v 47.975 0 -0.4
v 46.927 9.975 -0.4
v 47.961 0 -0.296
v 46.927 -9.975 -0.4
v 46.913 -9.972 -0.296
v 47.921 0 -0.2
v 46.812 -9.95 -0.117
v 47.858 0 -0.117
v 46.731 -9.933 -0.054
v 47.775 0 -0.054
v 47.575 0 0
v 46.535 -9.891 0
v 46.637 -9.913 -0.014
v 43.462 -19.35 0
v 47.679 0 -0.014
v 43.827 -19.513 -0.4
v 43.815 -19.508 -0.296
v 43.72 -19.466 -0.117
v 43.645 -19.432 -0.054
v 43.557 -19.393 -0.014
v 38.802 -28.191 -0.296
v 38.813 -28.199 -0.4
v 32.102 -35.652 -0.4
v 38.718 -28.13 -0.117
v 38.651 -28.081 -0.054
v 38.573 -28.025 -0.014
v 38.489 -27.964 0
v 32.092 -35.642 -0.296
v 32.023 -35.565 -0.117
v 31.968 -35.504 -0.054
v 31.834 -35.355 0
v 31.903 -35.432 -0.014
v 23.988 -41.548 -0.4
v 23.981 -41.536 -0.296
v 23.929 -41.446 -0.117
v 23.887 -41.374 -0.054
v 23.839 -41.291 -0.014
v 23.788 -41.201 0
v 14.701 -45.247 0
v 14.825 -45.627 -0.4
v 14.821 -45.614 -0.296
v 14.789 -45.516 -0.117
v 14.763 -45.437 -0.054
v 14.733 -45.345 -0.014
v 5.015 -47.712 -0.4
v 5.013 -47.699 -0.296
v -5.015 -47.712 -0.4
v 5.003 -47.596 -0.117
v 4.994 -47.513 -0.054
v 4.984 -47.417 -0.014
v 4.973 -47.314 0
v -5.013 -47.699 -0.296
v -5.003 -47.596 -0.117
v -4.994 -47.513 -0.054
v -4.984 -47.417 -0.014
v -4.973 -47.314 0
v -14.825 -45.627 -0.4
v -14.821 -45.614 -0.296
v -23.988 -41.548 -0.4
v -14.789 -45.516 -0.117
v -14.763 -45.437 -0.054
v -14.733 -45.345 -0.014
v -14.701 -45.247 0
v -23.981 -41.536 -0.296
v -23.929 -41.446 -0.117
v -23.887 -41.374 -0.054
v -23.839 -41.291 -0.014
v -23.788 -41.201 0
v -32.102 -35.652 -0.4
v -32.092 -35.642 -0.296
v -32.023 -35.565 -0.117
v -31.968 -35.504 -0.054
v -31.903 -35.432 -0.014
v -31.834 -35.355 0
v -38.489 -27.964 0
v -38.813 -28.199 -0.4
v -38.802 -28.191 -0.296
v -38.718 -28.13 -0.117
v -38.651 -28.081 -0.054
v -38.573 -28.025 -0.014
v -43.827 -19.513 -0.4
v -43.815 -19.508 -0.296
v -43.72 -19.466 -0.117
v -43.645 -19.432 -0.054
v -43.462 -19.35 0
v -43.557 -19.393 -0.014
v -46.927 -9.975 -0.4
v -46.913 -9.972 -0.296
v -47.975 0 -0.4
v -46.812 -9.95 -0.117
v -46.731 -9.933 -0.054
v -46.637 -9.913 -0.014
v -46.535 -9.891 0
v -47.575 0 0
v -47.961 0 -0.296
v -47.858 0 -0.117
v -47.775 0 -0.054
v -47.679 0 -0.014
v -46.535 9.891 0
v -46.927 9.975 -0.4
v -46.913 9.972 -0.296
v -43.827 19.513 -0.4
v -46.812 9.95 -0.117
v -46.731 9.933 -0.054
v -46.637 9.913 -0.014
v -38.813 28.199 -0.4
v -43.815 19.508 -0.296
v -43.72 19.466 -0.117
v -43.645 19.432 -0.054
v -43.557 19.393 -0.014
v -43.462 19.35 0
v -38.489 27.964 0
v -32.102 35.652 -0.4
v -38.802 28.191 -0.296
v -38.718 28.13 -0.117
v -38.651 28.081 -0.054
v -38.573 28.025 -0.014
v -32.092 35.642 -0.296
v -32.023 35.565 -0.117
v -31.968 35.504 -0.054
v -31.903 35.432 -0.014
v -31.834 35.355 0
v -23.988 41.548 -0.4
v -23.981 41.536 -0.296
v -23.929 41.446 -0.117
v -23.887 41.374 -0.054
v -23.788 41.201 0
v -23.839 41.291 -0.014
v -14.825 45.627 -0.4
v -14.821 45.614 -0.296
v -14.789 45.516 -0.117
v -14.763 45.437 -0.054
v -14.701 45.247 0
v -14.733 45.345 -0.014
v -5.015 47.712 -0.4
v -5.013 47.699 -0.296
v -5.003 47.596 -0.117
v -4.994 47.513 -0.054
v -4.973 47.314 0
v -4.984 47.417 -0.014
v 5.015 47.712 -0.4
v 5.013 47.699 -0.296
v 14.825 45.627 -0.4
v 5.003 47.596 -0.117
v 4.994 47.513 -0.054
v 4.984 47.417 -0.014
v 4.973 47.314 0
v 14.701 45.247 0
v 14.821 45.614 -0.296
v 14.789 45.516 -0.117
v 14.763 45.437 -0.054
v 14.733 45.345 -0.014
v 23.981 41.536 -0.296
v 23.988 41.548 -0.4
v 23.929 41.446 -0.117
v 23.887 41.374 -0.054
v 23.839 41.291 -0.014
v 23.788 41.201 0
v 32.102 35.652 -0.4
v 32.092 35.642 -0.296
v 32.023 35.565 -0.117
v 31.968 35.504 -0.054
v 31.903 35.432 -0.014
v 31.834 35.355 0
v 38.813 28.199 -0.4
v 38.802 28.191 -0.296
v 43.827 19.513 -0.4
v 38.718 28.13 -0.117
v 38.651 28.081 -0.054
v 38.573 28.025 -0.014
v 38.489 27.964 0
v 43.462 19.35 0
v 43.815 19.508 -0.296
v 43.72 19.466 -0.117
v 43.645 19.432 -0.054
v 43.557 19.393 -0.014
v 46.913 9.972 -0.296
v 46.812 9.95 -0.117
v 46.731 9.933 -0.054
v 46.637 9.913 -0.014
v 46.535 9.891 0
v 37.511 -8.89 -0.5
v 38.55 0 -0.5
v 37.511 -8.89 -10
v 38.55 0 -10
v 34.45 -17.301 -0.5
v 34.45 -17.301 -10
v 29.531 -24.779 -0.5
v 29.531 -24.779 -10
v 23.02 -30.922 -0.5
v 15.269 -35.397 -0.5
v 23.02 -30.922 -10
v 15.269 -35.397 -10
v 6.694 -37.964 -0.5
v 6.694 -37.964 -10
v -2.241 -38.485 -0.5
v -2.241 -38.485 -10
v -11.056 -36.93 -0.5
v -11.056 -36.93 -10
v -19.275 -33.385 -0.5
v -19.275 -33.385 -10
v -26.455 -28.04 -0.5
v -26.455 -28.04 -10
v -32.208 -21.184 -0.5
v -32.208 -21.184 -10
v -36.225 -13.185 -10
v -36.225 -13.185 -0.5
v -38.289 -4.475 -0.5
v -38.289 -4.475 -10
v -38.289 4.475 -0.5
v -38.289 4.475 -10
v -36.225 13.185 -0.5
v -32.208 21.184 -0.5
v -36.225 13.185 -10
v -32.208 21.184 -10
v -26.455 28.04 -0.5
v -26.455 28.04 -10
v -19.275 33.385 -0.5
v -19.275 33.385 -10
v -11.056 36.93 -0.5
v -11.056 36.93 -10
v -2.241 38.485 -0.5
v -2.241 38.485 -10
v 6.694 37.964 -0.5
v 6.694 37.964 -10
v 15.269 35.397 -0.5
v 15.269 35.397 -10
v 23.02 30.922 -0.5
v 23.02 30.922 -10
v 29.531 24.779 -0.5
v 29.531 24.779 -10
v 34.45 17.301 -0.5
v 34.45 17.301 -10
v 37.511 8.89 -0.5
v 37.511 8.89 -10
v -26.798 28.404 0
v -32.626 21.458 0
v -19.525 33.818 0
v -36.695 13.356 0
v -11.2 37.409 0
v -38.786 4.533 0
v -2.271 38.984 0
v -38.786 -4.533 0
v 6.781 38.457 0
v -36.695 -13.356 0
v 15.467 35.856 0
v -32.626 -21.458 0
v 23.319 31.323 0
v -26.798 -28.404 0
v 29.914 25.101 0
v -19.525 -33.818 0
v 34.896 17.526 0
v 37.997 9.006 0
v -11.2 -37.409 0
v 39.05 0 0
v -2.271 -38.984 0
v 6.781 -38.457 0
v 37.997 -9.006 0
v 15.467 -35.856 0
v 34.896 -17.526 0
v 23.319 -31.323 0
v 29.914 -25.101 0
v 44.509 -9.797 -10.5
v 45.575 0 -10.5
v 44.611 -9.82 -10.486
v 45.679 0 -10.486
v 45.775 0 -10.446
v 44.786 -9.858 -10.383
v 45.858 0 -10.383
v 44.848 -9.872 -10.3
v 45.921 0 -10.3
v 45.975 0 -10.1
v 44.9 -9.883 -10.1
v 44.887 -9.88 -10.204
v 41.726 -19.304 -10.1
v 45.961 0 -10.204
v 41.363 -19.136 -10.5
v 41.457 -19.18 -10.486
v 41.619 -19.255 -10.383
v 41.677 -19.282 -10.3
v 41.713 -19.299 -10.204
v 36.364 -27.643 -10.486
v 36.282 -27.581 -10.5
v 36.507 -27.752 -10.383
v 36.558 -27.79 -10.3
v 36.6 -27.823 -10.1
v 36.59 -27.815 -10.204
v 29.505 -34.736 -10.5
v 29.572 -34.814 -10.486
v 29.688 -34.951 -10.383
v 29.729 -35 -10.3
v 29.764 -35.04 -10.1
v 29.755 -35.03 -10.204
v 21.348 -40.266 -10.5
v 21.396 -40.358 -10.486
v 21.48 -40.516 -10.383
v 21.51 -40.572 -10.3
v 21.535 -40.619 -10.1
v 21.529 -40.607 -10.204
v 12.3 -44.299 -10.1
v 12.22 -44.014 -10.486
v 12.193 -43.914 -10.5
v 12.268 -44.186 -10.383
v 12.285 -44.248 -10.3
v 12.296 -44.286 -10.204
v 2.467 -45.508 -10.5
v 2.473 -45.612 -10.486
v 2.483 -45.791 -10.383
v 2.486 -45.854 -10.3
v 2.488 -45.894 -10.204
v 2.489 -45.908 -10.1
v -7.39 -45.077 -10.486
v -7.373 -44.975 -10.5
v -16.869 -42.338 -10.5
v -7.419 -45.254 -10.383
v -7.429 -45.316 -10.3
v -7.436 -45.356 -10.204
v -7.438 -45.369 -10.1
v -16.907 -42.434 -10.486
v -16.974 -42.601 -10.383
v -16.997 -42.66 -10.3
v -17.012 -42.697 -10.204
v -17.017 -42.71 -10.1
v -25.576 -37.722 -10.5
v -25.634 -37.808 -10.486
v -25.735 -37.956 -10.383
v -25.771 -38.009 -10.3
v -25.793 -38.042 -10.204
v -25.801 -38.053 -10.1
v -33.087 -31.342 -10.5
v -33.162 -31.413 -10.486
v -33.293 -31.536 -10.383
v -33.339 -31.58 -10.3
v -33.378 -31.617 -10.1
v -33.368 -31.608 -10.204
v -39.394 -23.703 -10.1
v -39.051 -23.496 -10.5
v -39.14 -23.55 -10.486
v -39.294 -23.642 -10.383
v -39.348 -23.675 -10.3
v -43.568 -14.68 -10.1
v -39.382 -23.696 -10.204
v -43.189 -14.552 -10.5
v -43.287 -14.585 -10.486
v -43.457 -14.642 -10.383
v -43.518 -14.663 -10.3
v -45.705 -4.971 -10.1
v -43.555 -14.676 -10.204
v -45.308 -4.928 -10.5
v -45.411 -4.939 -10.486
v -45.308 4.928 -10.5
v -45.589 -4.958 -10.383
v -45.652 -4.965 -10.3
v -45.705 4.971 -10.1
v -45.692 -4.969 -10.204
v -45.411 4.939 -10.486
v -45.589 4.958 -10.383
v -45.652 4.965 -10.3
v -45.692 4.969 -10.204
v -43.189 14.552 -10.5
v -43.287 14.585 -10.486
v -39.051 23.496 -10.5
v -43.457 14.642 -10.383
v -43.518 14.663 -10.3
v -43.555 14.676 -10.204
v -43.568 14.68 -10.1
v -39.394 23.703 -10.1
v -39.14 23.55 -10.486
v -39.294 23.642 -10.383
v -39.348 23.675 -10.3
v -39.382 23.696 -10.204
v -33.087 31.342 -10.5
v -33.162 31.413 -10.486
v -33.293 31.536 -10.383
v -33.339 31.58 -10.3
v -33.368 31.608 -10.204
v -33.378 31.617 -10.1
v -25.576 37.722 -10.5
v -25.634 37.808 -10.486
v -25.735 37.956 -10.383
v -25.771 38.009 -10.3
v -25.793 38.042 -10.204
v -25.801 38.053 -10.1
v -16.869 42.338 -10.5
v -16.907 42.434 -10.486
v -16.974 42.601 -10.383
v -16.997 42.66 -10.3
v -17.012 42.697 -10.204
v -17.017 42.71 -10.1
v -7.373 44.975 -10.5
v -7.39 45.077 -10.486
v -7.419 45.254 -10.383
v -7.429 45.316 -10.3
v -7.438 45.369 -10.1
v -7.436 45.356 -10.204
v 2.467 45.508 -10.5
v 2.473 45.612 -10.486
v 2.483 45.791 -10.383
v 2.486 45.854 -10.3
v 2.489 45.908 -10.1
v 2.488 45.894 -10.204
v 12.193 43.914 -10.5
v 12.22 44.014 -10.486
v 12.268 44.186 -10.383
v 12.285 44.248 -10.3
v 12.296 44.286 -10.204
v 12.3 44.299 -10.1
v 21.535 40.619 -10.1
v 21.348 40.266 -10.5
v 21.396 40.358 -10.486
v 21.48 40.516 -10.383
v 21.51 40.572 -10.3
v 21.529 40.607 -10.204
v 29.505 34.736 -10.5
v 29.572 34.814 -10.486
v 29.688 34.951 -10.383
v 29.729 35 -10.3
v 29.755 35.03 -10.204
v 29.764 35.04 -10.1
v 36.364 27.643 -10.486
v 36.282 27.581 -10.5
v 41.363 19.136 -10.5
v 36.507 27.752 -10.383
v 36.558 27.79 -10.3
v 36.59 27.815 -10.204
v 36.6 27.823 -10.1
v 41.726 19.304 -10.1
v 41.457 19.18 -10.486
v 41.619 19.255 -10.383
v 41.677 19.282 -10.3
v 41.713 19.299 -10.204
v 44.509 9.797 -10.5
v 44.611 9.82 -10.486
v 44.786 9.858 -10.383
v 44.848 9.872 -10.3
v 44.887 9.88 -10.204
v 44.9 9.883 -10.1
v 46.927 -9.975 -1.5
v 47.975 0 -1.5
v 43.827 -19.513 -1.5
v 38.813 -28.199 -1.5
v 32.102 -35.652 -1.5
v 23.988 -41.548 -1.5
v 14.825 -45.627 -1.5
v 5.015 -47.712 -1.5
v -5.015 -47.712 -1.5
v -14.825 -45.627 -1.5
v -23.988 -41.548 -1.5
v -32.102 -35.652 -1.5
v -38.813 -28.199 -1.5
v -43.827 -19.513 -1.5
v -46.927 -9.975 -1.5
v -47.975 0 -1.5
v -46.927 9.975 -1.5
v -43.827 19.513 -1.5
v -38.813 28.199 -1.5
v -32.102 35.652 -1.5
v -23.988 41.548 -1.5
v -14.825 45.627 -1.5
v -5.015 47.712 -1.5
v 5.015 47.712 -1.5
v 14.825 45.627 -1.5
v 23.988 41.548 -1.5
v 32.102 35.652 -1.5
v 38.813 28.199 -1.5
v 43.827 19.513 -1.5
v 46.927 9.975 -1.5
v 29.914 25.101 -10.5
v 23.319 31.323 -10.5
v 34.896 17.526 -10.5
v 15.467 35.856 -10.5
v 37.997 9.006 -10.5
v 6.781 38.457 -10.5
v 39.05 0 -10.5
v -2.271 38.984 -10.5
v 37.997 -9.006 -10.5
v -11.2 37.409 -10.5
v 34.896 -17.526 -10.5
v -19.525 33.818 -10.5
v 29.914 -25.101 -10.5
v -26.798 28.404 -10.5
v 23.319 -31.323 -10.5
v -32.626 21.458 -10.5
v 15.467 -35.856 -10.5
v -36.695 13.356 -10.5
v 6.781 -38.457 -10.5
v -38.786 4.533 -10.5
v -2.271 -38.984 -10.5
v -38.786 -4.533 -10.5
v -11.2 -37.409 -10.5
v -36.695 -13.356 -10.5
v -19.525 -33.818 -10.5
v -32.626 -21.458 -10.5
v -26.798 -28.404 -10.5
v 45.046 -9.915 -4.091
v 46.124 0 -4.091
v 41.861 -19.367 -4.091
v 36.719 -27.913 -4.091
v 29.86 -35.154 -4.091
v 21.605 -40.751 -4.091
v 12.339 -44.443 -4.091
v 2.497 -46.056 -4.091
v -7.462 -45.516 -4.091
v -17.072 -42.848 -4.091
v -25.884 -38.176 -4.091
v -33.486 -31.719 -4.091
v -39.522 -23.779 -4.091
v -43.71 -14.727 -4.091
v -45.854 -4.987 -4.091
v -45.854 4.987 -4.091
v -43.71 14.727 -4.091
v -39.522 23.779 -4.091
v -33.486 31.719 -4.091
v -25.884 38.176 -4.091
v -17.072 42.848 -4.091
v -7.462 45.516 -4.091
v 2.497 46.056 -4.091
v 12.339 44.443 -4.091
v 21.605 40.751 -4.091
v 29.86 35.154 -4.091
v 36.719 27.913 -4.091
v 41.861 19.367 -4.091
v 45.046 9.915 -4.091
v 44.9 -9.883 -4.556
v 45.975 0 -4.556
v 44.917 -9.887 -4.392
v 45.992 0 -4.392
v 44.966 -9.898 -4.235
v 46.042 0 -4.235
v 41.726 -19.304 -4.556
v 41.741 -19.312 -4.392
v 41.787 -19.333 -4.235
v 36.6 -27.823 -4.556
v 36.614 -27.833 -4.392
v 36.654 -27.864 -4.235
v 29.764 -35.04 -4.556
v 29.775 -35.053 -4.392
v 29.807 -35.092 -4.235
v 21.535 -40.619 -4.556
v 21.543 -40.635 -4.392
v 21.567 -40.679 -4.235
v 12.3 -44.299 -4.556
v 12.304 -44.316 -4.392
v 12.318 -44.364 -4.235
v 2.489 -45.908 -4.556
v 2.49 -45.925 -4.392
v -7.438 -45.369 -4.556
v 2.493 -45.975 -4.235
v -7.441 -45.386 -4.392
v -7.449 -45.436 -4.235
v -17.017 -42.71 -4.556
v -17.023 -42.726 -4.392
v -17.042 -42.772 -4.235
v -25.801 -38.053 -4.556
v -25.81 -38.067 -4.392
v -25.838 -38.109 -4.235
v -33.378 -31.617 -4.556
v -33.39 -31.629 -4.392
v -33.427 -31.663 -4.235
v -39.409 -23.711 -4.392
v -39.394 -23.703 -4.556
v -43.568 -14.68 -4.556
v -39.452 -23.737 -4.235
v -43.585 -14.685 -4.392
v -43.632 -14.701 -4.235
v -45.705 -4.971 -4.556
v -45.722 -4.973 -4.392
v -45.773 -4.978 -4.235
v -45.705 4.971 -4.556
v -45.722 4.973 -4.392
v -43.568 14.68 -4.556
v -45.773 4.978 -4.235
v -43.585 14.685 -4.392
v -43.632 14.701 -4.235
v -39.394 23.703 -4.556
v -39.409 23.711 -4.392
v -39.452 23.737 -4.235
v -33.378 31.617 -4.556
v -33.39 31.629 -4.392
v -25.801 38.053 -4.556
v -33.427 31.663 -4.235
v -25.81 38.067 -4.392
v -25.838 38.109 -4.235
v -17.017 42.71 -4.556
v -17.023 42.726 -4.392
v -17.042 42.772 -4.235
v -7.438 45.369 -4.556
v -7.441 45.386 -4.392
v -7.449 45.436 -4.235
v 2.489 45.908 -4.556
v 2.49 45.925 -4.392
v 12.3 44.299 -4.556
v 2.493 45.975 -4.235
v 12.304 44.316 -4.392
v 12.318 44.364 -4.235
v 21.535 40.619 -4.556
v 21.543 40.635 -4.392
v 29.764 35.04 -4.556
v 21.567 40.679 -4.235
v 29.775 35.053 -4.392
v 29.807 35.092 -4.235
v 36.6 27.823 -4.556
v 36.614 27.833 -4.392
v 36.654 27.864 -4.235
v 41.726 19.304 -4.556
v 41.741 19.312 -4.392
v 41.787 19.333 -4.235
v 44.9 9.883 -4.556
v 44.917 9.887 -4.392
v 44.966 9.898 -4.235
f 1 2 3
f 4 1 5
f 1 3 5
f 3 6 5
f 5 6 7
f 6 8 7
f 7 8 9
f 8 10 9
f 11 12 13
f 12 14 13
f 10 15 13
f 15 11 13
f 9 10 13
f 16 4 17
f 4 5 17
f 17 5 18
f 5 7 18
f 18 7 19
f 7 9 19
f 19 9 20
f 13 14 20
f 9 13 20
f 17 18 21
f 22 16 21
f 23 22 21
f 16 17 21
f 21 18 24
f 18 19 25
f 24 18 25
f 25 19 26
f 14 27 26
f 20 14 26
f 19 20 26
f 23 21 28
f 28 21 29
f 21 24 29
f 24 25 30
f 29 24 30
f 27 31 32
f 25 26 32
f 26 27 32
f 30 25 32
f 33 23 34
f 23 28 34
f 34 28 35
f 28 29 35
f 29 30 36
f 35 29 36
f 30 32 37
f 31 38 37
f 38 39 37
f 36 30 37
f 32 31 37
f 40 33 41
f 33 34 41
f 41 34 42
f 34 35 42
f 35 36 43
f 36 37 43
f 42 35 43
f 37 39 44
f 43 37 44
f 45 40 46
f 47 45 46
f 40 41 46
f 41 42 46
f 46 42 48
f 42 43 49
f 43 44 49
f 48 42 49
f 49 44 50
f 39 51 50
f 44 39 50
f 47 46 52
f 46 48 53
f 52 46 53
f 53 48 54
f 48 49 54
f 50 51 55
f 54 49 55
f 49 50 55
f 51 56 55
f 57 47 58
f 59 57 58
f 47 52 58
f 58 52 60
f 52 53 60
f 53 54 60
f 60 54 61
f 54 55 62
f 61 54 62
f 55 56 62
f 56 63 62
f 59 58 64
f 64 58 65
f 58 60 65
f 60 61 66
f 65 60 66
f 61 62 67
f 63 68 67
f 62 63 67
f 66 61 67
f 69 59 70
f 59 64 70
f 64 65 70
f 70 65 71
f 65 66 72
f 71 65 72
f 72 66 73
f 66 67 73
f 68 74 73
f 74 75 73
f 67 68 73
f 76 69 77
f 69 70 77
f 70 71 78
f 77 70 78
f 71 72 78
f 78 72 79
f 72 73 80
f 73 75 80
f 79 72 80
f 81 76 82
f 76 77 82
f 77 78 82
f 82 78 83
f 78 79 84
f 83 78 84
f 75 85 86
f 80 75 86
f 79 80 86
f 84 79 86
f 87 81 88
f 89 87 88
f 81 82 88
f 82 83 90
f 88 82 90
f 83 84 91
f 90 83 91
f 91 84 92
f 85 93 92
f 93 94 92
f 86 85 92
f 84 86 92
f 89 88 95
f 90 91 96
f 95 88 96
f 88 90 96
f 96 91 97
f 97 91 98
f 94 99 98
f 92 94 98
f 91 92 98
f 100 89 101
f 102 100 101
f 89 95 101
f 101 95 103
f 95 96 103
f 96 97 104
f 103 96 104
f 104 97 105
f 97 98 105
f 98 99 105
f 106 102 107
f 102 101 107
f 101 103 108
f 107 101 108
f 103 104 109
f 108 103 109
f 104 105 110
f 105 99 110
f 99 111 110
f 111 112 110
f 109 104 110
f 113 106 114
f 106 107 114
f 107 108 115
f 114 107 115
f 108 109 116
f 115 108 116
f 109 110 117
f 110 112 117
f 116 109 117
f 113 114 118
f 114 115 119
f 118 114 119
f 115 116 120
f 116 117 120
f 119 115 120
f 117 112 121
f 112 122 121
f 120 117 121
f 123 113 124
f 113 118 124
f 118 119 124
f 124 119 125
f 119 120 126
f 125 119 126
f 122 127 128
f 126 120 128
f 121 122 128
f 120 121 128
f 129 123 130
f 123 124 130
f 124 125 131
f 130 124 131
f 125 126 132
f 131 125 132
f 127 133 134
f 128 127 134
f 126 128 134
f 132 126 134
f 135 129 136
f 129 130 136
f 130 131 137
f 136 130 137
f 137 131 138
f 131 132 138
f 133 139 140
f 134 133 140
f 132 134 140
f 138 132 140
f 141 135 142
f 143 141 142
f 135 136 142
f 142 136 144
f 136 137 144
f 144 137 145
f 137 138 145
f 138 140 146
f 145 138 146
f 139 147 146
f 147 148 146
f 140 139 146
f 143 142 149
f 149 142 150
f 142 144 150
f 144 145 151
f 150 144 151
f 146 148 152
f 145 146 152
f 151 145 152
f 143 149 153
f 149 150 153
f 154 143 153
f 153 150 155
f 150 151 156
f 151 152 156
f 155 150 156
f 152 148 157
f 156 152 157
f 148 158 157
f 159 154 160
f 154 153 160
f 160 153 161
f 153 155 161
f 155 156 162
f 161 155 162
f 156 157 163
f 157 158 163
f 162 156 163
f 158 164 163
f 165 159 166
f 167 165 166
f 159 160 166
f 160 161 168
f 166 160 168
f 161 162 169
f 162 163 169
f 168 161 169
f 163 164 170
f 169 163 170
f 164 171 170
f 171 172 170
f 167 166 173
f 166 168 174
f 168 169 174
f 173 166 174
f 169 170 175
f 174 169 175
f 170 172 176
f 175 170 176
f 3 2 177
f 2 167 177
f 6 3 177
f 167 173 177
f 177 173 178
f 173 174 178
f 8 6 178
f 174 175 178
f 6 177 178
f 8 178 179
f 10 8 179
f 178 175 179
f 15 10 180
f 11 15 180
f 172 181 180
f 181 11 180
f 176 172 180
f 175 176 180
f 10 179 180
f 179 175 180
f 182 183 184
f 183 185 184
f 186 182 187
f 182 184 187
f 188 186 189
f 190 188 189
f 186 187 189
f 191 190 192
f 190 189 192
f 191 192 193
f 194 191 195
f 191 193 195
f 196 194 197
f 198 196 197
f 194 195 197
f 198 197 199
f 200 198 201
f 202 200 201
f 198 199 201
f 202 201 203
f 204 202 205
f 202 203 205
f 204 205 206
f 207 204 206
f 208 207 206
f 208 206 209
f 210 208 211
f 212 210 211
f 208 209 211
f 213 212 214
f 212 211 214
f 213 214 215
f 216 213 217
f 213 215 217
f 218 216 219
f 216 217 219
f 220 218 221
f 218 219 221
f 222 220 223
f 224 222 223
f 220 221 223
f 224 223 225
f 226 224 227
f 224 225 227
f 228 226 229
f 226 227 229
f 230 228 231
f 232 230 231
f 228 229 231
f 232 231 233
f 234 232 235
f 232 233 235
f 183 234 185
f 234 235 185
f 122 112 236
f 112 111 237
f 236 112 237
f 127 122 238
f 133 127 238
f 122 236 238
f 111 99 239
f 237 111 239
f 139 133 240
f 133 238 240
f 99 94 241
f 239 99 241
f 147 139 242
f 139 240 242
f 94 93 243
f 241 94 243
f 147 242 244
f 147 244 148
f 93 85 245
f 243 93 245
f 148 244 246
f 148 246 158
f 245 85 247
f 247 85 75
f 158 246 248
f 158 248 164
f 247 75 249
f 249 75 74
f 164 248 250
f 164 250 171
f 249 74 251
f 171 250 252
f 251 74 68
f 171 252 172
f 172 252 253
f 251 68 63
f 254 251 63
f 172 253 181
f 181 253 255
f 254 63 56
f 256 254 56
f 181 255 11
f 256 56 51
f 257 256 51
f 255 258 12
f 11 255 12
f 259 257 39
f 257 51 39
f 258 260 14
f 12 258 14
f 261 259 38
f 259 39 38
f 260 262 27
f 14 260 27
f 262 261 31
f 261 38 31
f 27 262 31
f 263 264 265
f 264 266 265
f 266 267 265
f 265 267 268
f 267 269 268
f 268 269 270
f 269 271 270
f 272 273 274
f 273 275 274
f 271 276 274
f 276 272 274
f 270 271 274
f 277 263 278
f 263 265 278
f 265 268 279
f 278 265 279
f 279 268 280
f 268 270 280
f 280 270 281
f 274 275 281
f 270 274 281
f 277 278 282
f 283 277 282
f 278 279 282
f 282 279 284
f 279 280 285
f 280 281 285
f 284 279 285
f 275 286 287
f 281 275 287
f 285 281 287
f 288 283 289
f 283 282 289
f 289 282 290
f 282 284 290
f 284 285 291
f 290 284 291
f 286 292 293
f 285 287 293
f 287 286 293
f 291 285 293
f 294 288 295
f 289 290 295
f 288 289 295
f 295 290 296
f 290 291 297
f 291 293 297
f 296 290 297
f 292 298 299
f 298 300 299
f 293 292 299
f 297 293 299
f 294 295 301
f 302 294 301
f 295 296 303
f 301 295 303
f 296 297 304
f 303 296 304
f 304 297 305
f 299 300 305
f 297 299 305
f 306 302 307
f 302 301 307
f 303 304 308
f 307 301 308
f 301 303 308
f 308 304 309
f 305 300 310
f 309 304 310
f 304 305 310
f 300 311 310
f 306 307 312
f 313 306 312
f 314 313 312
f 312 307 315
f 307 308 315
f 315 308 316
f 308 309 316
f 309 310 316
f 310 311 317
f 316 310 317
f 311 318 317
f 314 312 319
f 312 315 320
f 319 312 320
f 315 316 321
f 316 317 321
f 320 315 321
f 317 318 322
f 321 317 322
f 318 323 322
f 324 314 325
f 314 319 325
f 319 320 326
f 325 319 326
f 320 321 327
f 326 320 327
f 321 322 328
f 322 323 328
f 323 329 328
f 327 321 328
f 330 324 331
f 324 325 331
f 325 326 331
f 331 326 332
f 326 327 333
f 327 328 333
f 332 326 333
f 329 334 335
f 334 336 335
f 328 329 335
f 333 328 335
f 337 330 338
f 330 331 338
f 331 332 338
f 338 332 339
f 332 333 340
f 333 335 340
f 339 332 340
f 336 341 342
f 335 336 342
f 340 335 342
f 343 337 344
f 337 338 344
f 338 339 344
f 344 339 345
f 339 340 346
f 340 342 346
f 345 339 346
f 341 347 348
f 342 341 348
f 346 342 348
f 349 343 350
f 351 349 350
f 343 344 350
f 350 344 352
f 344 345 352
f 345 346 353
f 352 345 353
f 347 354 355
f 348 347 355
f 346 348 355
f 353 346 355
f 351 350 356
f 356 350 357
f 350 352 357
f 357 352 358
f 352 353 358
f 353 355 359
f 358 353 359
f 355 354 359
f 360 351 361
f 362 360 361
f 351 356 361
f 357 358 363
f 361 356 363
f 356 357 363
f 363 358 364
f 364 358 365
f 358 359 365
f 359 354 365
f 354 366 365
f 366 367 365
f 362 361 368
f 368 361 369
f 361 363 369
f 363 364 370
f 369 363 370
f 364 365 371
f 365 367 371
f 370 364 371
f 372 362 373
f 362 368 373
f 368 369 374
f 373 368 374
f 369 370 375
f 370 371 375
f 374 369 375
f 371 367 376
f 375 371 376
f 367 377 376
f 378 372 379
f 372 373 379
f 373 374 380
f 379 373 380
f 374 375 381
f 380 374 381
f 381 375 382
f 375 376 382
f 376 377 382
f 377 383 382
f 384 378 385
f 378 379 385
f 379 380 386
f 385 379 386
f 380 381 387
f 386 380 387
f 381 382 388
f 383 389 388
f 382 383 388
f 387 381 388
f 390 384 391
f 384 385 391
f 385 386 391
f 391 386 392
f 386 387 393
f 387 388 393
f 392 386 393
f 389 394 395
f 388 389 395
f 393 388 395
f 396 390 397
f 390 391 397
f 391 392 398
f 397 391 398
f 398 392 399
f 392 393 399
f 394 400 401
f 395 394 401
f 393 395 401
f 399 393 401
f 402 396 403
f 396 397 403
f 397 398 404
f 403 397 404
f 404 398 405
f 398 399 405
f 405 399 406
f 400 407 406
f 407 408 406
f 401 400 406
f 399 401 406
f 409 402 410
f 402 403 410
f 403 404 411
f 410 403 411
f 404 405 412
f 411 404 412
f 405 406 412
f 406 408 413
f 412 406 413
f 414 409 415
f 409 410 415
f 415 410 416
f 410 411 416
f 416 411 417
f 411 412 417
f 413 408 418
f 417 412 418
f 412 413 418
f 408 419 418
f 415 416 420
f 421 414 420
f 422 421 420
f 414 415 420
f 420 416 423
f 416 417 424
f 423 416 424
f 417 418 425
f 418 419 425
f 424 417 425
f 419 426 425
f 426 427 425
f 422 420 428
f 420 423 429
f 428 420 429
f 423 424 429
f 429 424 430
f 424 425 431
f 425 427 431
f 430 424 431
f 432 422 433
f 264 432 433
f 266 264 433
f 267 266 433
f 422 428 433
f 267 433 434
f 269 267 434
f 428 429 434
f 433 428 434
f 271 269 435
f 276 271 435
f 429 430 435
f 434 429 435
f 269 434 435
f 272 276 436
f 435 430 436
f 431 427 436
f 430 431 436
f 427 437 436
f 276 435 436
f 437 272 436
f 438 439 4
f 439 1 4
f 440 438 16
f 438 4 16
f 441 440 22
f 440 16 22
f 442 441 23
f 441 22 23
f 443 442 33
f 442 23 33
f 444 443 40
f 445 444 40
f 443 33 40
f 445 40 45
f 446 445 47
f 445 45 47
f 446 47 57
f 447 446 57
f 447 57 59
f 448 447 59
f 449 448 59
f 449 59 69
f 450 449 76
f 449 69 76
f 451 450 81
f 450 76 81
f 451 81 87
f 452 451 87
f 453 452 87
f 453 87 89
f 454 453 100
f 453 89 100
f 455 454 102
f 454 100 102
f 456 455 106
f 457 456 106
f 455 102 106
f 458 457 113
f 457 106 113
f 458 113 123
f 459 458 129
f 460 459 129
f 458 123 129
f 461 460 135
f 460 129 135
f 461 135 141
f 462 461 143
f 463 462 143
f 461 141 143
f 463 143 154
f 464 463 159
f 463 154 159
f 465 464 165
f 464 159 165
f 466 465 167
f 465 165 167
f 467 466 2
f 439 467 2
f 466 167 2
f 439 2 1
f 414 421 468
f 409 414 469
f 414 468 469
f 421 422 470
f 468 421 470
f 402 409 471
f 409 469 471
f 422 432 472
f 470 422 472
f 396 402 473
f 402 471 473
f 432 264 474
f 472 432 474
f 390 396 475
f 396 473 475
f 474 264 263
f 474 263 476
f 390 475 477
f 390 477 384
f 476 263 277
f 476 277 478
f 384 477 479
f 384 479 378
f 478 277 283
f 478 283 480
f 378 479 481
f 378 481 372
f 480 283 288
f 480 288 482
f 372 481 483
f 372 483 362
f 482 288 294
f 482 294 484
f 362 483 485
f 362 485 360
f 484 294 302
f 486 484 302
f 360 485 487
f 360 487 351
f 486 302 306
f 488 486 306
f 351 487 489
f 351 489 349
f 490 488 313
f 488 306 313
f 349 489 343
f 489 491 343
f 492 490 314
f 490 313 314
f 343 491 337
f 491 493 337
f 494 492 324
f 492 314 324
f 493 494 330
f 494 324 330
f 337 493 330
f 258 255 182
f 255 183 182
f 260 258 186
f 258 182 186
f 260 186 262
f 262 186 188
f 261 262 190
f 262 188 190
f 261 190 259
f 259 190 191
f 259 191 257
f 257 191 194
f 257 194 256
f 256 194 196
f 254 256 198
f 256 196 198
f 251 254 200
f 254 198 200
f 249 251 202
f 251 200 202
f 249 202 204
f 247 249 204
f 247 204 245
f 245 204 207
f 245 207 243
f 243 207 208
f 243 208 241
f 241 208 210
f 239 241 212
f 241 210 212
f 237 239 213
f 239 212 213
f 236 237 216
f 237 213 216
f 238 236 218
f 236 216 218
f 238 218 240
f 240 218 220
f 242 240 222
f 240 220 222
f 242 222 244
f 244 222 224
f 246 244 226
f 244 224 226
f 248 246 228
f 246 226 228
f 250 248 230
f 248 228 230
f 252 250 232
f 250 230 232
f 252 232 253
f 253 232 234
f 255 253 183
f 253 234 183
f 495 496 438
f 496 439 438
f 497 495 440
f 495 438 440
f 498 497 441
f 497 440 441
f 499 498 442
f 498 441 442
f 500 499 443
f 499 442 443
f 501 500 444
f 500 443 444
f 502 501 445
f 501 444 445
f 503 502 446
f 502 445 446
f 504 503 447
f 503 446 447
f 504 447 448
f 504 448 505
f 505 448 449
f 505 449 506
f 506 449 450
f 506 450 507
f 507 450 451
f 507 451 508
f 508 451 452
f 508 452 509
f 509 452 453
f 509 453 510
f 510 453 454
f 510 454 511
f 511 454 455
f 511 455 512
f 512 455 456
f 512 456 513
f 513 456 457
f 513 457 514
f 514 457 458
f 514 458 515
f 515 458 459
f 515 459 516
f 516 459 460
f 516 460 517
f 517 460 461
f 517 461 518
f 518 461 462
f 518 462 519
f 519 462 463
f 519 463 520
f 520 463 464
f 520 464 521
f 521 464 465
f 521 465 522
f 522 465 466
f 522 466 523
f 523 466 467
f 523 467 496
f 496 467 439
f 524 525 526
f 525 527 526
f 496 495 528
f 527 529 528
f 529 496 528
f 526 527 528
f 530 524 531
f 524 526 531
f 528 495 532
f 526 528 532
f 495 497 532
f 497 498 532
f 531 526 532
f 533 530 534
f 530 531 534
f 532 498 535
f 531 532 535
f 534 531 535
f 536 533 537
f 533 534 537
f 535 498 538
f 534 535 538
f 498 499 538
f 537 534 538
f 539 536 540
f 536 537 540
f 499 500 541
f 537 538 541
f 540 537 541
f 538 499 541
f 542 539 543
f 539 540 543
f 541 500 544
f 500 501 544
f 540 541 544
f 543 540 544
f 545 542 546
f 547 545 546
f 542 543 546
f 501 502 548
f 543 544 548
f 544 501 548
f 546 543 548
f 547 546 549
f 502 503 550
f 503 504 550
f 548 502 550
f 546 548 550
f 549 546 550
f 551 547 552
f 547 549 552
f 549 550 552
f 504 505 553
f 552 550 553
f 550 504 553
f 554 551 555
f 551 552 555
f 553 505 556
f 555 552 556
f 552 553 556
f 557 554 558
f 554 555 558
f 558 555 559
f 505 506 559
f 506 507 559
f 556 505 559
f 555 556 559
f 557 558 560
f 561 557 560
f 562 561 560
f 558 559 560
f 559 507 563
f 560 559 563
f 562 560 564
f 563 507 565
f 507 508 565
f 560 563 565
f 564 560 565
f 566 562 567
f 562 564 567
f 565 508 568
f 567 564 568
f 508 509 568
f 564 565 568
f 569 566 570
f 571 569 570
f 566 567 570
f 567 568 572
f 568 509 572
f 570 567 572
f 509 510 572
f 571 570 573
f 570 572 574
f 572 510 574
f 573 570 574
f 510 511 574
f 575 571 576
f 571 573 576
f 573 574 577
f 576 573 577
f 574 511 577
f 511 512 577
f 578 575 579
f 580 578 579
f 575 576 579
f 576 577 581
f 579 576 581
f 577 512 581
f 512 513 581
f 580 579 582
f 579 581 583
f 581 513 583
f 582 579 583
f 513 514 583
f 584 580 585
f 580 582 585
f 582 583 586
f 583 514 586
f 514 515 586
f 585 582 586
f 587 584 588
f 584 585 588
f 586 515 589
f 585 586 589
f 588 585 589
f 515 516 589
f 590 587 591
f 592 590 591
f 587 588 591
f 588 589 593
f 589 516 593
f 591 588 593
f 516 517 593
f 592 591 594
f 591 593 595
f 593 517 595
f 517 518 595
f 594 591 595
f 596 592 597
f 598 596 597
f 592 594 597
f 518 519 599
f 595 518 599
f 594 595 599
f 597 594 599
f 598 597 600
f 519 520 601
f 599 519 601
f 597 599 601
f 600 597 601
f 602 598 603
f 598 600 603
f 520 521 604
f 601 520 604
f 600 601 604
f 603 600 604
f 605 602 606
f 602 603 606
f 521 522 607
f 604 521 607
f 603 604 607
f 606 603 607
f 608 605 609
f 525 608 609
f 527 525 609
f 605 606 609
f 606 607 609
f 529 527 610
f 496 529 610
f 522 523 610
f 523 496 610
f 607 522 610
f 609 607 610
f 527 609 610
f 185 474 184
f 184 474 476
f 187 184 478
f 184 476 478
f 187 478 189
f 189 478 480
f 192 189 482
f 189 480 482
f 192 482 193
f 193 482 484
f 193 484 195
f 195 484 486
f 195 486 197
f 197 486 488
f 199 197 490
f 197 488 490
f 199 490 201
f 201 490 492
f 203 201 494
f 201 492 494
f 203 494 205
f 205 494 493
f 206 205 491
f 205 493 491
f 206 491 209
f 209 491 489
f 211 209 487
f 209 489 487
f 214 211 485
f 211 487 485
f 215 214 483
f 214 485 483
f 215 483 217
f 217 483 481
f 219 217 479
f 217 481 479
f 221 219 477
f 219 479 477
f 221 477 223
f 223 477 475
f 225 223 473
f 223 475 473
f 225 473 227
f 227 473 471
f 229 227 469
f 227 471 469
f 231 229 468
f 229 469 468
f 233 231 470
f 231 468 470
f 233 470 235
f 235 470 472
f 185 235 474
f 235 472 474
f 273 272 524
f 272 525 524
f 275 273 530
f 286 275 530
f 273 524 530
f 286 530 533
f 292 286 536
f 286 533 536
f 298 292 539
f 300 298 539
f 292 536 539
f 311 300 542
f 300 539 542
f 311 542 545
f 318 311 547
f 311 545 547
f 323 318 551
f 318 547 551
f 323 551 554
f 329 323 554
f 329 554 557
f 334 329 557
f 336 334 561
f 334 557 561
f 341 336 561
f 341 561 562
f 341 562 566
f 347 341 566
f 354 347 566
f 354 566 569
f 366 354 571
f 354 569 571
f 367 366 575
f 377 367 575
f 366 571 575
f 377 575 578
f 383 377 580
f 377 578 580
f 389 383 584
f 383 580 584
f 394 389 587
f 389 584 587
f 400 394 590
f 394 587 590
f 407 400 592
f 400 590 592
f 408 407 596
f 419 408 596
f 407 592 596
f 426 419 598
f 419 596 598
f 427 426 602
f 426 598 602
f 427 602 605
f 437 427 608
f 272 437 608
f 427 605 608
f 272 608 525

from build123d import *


with BuildPart() as part:
    # Sketch1 → Revolve1 (revolve)
    with BuildSketch(Plane(origin=(0, 0, 0), x_dir=(0, 0, -1), z_dir=(1, 0, 0)), mode=Mode.PRIVATE) as revolve1_sk:
        with BuildLine():
            Line((0, 39.05), (0.5, 38.55))
            Line((0.5, 38.55), (10, 38.55))
            Line((10, 38.55), (10.5, 39.05))
            Line((10.5, 39.05), (10.5, 45.575))
            ThreePointArc((10.5, 45.575), (10.382842712, 45.857842712), (10.1, 45.975))
            Line((10.1, 45.975), (4.556372043, 45.975))
            ThreePointArc((4.556372043, 45.975), (4.312230098, 46.013163593), (4.091381488, 46.124013223))
            Line((4.091381488, 46.124013223), (1.5, 47.975))
            Line((1.5, 47.975), (0.4, 47.975))
            ThreePointArc((0.4, 47.975), (0.117157288, 47.857842712), (0, 47.575))
            Line((0, 47.575), (0, 39.05))
        make_face()
    revolve(revolve1_sk.sketch.rotate(Axis((0, 0, 0), (0, 0, -1)), 90), axis=Axis((0, 0, 0), (0, 0, -1)))


solid = part.part
